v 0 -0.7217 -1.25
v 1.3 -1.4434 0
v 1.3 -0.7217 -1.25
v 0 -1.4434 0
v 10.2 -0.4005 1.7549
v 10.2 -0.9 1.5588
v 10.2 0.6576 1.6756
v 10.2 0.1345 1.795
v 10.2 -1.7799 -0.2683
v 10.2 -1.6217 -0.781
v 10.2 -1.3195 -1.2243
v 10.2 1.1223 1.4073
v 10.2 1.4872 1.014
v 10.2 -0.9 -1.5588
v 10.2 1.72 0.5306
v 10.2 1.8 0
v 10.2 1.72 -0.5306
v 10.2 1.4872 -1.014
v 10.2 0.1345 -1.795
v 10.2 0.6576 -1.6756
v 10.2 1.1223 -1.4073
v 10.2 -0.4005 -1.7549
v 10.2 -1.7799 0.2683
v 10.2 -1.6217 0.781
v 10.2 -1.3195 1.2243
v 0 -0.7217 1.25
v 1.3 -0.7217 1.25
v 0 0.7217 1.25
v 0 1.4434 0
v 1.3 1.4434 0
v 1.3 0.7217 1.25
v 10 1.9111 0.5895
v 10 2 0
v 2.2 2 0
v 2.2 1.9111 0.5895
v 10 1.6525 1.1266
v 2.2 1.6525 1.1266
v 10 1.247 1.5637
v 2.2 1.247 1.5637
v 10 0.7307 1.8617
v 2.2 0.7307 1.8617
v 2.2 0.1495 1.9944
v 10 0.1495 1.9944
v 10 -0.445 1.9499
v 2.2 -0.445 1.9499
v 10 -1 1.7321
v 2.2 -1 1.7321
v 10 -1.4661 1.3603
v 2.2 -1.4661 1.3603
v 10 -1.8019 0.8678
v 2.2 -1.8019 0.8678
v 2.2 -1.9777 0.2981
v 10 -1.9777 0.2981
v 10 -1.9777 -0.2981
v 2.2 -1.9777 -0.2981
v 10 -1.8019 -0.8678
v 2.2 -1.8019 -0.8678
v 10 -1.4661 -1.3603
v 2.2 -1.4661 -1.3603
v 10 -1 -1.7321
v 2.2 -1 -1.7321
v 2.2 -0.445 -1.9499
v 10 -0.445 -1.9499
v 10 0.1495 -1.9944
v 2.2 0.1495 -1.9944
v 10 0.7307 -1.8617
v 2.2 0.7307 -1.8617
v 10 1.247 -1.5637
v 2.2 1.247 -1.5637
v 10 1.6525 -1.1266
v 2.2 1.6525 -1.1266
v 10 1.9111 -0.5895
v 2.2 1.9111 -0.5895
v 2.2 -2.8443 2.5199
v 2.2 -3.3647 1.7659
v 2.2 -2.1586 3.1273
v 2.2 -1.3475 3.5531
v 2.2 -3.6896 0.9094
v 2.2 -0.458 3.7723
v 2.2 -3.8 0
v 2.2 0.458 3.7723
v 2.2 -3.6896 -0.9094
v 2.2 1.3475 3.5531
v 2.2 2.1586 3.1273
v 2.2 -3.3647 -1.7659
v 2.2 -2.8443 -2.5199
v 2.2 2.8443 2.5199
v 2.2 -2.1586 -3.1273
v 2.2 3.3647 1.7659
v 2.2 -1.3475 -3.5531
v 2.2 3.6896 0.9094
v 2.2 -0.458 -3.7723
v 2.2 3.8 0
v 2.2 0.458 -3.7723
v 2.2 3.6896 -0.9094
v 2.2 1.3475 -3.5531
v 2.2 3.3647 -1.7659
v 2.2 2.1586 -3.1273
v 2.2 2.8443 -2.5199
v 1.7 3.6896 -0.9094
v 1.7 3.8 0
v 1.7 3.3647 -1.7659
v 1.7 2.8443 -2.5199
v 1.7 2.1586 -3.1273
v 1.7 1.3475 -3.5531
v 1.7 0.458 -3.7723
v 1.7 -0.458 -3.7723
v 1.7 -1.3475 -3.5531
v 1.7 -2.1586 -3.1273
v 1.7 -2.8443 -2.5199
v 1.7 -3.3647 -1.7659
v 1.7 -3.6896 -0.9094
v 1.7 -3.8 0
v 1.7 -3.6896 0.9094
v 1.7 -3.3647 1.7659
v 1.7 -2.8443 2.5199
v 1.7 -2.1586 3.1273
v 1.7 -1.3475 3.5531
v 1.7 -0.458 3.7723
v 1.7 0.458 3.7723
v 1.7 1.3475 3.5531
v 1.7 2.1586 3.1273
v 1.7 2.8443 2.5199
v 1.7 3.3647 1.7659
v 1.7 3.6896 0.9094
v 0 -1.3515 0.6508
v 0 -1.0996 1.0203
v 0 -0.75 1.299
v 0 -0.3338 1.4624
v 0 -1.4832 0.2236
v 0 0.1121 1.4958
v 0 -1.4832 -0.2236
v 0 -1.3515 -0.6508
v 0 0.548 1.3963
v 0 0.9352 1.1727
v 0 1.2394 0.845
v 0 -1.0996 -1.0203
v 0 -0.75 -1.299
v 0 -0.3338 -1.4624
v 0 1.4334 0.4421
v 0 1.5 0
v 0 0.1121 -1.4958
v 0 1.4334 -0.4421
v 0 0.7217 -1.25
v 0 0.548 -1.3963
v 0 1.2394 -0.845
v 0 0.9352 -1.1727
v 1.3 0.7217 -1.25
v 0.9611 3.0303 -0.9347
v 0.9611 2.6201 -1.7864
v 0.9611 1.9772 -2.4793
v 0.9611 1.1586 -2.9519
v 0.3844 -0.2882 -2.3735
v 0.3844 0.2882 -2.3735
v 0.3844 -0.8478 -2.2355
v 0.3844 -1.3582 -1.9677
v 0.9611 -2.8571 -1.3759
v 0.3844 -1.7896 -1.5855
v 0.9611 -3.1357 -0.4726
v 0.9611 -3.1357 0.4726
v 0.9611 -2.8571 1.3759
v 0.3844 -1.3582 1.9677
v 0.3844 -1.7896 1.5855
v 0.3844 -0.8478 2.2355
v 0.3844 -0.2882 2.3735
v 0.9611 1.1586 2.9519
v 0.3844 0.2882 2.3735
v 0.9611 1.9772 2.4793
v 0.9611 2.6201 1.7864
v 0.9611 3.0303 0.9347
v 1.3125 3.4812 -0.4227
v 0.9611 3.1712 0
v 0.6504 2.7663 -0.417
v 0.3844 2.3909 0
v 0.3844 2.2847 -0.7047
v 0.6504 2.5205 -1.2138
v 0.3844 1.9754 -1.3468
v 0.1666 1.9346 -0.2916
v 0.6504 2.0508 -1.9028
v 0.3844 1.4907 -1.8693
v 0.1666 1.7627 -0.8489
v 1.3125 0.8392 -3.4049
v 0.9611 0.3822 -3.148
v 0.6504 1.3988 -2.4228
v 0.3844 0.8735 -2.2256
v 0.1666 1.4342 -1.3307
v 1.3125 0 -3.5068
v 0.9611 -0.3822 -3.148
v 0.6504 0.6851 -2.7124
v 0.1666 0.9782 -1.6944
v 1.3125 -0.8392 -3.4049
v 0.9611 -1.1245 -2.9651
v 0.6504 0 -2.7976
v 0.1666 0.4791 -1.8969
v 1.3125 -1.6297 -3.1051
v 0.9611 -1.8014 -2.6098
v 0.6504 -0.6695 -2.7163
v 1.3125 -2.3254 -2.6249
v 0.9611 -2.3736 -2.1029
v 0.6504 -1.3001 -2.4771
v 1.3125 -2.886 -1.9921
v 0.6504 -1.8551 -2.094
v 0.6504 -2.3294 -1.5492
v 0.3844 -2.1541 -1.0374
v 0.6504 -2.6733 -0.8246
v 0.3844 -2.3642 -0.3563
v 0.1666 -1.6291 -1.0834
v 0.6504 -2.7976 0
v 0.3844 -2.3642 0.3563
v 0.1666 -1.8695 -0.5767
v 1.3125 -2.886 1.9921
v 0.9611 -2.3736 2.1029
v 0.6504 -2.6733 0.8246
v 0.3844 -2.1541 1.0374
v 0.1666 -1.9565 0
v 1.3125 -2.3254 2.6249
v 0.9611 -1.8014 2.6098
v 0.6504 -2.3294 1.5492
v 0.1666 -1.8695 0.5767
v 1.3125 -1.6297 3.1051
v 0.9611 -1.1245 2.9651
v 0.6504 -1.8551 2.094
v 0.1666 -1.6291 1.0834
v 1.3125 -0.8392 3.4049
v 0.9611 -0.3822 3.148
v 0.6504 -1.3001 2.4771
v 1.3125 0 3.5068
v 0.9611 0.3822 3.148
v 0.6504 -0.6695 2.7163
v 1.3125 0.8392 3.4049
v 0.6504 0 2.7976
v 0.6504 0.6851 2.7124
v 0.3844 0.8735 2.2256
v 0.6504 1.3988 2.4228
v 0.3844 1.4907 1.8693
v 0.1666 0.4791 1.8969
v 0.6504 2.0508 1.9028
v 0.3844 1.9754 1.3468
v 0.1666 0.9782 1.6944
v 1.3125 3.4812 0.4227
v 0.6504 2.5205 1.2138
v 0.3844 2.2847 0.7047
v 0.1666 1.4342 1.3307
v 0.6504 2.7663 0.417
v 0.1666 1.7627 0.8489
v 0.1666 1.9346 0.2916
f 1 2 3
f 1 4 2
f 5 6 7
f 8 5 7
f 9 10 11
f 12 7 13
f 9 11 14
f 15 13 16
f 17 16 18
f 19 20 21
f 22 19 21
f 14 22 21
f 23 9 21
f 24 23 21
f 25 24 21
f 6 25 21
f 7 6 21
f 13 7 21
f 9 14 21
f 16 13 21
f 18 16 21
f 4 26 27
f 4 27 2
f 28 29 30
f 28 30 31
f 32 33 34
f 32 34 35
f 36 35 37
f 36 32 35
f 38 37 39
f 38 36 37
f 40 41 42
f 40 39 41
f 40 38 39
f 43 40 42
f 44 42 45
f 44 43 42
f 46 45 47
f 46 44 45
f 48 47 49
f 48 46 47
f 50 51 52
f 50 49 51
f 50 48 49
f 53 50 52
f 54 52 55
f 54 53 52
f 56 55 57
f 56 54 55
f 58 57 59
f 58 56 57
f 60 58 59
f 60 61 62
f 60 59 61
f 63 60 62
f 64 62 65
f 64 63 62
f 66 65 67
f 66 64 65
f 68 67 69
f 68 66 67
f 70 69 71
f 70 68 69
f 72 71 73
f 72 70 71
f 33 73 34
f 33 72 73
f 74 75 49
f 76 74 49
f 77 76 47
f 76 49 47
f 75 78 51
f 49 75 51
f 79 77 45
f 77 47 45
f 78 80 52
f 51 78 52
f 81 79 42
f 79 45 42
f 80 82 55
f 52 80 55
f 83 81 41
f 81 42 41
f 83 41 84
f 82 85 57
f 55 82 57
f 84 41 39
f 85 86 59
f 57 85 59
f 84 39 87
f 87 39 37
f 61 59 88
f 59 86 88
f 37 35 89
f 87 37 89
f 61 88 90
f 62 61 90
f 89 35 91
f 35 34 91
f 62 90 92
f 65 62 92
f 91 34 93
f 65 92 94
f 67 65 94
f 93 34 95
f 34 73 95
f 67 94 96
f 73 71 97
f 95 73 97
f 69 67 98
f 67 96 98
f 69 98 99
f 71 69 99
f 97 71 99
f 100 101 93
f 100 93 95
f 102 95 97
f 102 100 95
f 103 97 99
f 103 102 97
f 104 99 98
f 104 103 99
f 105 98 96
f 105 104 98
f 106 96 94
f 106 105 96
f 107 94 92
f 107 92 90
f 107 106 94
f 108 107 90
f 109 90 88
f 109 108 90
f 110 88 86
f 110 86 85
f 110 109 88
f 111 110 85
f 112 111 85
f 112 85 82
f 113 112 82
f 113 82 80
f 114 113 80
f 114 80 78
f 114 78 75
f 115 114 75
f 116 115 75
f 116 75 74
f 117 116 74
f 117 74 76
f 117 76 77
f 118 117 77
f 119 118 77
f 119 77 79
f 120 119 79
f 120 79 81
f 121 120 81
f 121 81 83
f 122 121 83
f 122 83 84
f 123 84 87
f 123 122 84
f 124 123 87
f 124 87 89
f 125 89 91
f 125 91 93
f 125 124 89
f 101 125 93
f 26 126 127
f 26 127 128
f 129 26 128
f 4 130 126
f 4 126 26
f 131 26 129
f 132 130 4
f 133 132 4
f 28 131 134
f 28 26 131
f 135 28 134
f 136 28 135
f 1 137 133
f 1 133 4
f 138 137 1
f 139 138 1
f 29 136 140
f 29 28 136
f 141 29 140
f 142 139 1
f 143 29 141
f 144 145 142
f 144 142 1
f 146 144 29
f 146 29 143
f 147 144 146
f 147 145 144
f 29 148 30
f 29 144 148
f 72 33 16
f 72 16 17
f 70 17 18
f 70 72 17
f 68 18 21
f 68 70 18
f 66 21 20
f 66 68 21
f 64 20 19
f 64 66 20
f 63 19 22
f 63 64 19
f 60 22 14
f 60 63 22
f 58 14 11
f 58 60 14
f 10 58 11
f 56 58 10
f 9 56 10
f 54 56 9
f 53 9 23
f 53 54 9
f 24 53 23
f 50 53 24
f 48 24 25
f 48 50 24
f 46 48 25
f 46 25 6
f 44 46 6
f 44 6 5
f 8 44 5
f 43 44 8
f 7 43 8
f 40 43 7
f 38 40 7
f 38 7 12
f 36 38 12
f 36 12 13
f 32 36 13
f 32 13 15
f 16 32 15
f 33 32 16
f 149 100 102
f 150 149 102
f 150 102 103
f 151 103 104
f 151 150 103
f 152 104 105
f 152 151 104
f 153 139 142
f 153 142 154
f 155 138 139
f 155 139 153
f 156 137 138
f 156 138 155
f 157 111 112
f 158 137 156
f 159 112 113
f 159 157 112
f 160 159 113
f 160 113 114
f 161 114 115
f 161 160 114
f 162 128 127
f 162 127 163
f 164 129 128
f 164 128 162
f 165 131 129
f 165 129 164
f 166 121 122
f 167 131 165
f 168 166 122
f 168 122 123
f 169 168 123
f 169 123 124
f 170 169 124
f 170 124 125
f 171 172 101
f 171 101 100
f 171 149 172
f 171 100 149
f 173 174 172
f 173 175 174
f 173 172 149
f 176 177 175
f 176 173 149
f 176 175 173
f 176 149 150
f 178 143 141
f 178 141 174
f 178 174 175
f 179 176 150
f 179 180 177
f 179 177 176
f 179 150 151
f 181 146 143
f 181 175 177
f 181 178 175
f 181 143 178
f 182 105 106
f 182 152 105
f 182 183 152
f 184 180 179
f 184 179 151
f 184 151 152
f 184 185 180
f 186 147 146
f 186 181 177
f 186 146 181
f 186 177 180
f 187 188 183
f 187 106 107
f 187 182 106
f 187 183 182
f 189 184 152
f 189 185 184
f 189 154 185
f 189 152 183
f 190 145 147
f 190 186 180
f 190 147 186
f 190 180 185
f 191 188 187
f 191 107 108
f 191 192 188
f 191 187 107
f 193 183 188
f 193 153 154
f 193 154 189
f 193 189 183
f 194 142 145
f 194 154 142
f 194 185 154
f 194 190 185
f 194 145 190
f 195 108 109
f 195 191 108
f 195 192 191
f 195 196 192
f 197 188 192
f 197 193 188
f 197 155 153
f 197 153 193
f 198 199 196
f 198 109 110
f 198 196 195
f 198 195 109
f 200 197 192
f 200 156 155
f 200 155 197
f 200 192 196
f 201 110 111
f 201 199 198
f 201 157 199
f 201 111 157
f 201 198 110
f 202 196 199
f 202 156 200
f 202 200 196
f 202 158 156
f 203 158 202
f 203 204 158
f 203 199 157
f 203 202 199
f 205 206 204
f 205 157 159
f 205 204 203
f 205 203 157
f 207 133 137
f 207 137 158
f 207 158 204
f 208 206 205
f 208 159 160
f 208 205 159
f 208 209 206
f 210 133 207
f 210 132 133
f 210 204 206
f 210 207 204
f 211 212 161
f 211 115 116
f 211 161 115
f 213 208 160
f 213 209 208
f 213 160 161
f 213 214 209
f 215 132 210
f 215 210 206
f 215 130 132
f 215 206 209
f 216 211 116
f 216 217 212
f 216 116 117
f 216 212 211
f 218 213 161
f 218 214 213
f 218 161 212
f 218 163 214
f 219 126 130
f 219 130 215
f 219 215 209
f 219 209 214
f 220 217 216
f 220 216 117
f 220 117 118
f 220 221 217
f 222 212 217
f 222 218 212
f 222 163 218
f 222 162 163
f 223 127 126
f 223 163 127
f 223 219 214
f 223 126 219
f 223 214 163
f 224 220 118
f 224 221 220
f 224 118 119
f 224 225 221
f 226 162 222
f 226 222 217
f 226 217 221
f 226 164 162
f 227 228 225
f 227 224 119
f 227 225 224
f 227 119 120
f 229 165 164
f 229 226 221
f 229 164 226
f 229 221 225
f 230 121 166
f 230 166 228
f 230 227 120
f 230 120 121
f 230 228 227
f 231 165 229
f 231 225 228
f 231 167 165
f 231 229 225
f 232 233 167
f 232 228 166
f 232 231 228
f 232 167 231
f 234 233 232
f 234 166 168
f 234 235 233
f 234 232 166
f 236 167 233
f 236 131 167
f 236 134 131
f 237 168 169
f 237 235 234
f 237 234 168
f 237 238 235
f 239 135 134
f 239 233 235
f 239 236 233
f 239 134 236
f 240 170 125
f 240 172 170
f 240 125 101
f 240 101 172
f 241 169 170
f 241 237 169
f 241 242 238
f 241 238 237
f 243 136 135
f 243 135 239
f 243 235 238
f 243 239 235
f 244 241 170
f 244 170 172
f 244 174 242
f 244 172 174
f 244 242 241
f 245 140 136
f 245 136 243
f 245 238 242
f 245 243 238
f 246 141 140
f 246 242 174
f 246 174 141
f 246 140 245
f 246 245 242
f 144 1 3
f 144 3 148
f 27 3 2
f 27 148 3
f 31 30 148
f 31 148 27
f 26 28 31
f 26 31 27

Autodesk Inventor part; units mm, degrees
ref_plane "YZ Plane" through (0, 0, 0) normal (1, 0, 0) x (0, 1, 0)
ref_plane "XZ Plane" through (0, 0, 0) normal (0, 1, 0) x (-1, 0, 0)
ref_plane "XY Plane" through (0, 0, 0) normal (0, 0, 1) x (1, 0, 0)
sketch "Sketch1" plane through (0, 0, 0) normal (0, 0, 1) x (1, 0, 0)
  line L0 (0, 0) -> (0, 1.5)
  line L1 (2.2, 3.8) -> (2.2, 2)
  line L2 (2.2, 2) -> (10.2, 2)
  line L3 (10.2, 2) -> (10.2, 0)
  line L4 (10.2, 0) -> (0, 0)
  line L5 (2.2, 3.8) -> (1.7, 3.8)
  arc A0 (1.7, 3.8) -> (0, 1.5) centre (4.0624, 0.2756) ccw
  dimension "d0" = 2.2
  dimension "d1" = 8
  dimension "d2" = 3.8
  dimension "d4" = 0.5
  dimension "d5" = 2
  dimension "d7" = 1.5
revolve "Revolution1" add sketch "Sketch1" angle 360 about axis through (10.2, 0, 0) along (-1, 0, 0)
sketch "Sketch2" plane through (0, 0, 0) normal (-1, 0, 0) x (0, 0, 1)
  line L0 (-1.25, -0.7217) -> (-1.25, 0.7217)
  line L1 (-1.25, 0.7217) -> (0, 1.4434)
  line L2 (0, 1.4434) -> (1.25, 0.7217)
  line L3 (1.25, 0.7217) -> (1.25, -0.7217)
  line L4 (1.25, -0.7217) -> (0, -1.4434)
  line L5 (0, -1.4434) -> (-1.25, -0.7217)
  point P0 (0, 0)
  point P1 (0, 0)
  dimension "d8" = 2.5
extrude "Extrusion1" cut sketch "Sketch2" against normal blind 1.3
chamfer "Chamfer1" distance 0.2 angle 45 1 edges at (10.2, -2, 0)
thread "Thread1" size "M4x0.7" class "6g" standard "ANSI Metric M Profile" full length
properties part number "M4 x 8 mm BHCS"
